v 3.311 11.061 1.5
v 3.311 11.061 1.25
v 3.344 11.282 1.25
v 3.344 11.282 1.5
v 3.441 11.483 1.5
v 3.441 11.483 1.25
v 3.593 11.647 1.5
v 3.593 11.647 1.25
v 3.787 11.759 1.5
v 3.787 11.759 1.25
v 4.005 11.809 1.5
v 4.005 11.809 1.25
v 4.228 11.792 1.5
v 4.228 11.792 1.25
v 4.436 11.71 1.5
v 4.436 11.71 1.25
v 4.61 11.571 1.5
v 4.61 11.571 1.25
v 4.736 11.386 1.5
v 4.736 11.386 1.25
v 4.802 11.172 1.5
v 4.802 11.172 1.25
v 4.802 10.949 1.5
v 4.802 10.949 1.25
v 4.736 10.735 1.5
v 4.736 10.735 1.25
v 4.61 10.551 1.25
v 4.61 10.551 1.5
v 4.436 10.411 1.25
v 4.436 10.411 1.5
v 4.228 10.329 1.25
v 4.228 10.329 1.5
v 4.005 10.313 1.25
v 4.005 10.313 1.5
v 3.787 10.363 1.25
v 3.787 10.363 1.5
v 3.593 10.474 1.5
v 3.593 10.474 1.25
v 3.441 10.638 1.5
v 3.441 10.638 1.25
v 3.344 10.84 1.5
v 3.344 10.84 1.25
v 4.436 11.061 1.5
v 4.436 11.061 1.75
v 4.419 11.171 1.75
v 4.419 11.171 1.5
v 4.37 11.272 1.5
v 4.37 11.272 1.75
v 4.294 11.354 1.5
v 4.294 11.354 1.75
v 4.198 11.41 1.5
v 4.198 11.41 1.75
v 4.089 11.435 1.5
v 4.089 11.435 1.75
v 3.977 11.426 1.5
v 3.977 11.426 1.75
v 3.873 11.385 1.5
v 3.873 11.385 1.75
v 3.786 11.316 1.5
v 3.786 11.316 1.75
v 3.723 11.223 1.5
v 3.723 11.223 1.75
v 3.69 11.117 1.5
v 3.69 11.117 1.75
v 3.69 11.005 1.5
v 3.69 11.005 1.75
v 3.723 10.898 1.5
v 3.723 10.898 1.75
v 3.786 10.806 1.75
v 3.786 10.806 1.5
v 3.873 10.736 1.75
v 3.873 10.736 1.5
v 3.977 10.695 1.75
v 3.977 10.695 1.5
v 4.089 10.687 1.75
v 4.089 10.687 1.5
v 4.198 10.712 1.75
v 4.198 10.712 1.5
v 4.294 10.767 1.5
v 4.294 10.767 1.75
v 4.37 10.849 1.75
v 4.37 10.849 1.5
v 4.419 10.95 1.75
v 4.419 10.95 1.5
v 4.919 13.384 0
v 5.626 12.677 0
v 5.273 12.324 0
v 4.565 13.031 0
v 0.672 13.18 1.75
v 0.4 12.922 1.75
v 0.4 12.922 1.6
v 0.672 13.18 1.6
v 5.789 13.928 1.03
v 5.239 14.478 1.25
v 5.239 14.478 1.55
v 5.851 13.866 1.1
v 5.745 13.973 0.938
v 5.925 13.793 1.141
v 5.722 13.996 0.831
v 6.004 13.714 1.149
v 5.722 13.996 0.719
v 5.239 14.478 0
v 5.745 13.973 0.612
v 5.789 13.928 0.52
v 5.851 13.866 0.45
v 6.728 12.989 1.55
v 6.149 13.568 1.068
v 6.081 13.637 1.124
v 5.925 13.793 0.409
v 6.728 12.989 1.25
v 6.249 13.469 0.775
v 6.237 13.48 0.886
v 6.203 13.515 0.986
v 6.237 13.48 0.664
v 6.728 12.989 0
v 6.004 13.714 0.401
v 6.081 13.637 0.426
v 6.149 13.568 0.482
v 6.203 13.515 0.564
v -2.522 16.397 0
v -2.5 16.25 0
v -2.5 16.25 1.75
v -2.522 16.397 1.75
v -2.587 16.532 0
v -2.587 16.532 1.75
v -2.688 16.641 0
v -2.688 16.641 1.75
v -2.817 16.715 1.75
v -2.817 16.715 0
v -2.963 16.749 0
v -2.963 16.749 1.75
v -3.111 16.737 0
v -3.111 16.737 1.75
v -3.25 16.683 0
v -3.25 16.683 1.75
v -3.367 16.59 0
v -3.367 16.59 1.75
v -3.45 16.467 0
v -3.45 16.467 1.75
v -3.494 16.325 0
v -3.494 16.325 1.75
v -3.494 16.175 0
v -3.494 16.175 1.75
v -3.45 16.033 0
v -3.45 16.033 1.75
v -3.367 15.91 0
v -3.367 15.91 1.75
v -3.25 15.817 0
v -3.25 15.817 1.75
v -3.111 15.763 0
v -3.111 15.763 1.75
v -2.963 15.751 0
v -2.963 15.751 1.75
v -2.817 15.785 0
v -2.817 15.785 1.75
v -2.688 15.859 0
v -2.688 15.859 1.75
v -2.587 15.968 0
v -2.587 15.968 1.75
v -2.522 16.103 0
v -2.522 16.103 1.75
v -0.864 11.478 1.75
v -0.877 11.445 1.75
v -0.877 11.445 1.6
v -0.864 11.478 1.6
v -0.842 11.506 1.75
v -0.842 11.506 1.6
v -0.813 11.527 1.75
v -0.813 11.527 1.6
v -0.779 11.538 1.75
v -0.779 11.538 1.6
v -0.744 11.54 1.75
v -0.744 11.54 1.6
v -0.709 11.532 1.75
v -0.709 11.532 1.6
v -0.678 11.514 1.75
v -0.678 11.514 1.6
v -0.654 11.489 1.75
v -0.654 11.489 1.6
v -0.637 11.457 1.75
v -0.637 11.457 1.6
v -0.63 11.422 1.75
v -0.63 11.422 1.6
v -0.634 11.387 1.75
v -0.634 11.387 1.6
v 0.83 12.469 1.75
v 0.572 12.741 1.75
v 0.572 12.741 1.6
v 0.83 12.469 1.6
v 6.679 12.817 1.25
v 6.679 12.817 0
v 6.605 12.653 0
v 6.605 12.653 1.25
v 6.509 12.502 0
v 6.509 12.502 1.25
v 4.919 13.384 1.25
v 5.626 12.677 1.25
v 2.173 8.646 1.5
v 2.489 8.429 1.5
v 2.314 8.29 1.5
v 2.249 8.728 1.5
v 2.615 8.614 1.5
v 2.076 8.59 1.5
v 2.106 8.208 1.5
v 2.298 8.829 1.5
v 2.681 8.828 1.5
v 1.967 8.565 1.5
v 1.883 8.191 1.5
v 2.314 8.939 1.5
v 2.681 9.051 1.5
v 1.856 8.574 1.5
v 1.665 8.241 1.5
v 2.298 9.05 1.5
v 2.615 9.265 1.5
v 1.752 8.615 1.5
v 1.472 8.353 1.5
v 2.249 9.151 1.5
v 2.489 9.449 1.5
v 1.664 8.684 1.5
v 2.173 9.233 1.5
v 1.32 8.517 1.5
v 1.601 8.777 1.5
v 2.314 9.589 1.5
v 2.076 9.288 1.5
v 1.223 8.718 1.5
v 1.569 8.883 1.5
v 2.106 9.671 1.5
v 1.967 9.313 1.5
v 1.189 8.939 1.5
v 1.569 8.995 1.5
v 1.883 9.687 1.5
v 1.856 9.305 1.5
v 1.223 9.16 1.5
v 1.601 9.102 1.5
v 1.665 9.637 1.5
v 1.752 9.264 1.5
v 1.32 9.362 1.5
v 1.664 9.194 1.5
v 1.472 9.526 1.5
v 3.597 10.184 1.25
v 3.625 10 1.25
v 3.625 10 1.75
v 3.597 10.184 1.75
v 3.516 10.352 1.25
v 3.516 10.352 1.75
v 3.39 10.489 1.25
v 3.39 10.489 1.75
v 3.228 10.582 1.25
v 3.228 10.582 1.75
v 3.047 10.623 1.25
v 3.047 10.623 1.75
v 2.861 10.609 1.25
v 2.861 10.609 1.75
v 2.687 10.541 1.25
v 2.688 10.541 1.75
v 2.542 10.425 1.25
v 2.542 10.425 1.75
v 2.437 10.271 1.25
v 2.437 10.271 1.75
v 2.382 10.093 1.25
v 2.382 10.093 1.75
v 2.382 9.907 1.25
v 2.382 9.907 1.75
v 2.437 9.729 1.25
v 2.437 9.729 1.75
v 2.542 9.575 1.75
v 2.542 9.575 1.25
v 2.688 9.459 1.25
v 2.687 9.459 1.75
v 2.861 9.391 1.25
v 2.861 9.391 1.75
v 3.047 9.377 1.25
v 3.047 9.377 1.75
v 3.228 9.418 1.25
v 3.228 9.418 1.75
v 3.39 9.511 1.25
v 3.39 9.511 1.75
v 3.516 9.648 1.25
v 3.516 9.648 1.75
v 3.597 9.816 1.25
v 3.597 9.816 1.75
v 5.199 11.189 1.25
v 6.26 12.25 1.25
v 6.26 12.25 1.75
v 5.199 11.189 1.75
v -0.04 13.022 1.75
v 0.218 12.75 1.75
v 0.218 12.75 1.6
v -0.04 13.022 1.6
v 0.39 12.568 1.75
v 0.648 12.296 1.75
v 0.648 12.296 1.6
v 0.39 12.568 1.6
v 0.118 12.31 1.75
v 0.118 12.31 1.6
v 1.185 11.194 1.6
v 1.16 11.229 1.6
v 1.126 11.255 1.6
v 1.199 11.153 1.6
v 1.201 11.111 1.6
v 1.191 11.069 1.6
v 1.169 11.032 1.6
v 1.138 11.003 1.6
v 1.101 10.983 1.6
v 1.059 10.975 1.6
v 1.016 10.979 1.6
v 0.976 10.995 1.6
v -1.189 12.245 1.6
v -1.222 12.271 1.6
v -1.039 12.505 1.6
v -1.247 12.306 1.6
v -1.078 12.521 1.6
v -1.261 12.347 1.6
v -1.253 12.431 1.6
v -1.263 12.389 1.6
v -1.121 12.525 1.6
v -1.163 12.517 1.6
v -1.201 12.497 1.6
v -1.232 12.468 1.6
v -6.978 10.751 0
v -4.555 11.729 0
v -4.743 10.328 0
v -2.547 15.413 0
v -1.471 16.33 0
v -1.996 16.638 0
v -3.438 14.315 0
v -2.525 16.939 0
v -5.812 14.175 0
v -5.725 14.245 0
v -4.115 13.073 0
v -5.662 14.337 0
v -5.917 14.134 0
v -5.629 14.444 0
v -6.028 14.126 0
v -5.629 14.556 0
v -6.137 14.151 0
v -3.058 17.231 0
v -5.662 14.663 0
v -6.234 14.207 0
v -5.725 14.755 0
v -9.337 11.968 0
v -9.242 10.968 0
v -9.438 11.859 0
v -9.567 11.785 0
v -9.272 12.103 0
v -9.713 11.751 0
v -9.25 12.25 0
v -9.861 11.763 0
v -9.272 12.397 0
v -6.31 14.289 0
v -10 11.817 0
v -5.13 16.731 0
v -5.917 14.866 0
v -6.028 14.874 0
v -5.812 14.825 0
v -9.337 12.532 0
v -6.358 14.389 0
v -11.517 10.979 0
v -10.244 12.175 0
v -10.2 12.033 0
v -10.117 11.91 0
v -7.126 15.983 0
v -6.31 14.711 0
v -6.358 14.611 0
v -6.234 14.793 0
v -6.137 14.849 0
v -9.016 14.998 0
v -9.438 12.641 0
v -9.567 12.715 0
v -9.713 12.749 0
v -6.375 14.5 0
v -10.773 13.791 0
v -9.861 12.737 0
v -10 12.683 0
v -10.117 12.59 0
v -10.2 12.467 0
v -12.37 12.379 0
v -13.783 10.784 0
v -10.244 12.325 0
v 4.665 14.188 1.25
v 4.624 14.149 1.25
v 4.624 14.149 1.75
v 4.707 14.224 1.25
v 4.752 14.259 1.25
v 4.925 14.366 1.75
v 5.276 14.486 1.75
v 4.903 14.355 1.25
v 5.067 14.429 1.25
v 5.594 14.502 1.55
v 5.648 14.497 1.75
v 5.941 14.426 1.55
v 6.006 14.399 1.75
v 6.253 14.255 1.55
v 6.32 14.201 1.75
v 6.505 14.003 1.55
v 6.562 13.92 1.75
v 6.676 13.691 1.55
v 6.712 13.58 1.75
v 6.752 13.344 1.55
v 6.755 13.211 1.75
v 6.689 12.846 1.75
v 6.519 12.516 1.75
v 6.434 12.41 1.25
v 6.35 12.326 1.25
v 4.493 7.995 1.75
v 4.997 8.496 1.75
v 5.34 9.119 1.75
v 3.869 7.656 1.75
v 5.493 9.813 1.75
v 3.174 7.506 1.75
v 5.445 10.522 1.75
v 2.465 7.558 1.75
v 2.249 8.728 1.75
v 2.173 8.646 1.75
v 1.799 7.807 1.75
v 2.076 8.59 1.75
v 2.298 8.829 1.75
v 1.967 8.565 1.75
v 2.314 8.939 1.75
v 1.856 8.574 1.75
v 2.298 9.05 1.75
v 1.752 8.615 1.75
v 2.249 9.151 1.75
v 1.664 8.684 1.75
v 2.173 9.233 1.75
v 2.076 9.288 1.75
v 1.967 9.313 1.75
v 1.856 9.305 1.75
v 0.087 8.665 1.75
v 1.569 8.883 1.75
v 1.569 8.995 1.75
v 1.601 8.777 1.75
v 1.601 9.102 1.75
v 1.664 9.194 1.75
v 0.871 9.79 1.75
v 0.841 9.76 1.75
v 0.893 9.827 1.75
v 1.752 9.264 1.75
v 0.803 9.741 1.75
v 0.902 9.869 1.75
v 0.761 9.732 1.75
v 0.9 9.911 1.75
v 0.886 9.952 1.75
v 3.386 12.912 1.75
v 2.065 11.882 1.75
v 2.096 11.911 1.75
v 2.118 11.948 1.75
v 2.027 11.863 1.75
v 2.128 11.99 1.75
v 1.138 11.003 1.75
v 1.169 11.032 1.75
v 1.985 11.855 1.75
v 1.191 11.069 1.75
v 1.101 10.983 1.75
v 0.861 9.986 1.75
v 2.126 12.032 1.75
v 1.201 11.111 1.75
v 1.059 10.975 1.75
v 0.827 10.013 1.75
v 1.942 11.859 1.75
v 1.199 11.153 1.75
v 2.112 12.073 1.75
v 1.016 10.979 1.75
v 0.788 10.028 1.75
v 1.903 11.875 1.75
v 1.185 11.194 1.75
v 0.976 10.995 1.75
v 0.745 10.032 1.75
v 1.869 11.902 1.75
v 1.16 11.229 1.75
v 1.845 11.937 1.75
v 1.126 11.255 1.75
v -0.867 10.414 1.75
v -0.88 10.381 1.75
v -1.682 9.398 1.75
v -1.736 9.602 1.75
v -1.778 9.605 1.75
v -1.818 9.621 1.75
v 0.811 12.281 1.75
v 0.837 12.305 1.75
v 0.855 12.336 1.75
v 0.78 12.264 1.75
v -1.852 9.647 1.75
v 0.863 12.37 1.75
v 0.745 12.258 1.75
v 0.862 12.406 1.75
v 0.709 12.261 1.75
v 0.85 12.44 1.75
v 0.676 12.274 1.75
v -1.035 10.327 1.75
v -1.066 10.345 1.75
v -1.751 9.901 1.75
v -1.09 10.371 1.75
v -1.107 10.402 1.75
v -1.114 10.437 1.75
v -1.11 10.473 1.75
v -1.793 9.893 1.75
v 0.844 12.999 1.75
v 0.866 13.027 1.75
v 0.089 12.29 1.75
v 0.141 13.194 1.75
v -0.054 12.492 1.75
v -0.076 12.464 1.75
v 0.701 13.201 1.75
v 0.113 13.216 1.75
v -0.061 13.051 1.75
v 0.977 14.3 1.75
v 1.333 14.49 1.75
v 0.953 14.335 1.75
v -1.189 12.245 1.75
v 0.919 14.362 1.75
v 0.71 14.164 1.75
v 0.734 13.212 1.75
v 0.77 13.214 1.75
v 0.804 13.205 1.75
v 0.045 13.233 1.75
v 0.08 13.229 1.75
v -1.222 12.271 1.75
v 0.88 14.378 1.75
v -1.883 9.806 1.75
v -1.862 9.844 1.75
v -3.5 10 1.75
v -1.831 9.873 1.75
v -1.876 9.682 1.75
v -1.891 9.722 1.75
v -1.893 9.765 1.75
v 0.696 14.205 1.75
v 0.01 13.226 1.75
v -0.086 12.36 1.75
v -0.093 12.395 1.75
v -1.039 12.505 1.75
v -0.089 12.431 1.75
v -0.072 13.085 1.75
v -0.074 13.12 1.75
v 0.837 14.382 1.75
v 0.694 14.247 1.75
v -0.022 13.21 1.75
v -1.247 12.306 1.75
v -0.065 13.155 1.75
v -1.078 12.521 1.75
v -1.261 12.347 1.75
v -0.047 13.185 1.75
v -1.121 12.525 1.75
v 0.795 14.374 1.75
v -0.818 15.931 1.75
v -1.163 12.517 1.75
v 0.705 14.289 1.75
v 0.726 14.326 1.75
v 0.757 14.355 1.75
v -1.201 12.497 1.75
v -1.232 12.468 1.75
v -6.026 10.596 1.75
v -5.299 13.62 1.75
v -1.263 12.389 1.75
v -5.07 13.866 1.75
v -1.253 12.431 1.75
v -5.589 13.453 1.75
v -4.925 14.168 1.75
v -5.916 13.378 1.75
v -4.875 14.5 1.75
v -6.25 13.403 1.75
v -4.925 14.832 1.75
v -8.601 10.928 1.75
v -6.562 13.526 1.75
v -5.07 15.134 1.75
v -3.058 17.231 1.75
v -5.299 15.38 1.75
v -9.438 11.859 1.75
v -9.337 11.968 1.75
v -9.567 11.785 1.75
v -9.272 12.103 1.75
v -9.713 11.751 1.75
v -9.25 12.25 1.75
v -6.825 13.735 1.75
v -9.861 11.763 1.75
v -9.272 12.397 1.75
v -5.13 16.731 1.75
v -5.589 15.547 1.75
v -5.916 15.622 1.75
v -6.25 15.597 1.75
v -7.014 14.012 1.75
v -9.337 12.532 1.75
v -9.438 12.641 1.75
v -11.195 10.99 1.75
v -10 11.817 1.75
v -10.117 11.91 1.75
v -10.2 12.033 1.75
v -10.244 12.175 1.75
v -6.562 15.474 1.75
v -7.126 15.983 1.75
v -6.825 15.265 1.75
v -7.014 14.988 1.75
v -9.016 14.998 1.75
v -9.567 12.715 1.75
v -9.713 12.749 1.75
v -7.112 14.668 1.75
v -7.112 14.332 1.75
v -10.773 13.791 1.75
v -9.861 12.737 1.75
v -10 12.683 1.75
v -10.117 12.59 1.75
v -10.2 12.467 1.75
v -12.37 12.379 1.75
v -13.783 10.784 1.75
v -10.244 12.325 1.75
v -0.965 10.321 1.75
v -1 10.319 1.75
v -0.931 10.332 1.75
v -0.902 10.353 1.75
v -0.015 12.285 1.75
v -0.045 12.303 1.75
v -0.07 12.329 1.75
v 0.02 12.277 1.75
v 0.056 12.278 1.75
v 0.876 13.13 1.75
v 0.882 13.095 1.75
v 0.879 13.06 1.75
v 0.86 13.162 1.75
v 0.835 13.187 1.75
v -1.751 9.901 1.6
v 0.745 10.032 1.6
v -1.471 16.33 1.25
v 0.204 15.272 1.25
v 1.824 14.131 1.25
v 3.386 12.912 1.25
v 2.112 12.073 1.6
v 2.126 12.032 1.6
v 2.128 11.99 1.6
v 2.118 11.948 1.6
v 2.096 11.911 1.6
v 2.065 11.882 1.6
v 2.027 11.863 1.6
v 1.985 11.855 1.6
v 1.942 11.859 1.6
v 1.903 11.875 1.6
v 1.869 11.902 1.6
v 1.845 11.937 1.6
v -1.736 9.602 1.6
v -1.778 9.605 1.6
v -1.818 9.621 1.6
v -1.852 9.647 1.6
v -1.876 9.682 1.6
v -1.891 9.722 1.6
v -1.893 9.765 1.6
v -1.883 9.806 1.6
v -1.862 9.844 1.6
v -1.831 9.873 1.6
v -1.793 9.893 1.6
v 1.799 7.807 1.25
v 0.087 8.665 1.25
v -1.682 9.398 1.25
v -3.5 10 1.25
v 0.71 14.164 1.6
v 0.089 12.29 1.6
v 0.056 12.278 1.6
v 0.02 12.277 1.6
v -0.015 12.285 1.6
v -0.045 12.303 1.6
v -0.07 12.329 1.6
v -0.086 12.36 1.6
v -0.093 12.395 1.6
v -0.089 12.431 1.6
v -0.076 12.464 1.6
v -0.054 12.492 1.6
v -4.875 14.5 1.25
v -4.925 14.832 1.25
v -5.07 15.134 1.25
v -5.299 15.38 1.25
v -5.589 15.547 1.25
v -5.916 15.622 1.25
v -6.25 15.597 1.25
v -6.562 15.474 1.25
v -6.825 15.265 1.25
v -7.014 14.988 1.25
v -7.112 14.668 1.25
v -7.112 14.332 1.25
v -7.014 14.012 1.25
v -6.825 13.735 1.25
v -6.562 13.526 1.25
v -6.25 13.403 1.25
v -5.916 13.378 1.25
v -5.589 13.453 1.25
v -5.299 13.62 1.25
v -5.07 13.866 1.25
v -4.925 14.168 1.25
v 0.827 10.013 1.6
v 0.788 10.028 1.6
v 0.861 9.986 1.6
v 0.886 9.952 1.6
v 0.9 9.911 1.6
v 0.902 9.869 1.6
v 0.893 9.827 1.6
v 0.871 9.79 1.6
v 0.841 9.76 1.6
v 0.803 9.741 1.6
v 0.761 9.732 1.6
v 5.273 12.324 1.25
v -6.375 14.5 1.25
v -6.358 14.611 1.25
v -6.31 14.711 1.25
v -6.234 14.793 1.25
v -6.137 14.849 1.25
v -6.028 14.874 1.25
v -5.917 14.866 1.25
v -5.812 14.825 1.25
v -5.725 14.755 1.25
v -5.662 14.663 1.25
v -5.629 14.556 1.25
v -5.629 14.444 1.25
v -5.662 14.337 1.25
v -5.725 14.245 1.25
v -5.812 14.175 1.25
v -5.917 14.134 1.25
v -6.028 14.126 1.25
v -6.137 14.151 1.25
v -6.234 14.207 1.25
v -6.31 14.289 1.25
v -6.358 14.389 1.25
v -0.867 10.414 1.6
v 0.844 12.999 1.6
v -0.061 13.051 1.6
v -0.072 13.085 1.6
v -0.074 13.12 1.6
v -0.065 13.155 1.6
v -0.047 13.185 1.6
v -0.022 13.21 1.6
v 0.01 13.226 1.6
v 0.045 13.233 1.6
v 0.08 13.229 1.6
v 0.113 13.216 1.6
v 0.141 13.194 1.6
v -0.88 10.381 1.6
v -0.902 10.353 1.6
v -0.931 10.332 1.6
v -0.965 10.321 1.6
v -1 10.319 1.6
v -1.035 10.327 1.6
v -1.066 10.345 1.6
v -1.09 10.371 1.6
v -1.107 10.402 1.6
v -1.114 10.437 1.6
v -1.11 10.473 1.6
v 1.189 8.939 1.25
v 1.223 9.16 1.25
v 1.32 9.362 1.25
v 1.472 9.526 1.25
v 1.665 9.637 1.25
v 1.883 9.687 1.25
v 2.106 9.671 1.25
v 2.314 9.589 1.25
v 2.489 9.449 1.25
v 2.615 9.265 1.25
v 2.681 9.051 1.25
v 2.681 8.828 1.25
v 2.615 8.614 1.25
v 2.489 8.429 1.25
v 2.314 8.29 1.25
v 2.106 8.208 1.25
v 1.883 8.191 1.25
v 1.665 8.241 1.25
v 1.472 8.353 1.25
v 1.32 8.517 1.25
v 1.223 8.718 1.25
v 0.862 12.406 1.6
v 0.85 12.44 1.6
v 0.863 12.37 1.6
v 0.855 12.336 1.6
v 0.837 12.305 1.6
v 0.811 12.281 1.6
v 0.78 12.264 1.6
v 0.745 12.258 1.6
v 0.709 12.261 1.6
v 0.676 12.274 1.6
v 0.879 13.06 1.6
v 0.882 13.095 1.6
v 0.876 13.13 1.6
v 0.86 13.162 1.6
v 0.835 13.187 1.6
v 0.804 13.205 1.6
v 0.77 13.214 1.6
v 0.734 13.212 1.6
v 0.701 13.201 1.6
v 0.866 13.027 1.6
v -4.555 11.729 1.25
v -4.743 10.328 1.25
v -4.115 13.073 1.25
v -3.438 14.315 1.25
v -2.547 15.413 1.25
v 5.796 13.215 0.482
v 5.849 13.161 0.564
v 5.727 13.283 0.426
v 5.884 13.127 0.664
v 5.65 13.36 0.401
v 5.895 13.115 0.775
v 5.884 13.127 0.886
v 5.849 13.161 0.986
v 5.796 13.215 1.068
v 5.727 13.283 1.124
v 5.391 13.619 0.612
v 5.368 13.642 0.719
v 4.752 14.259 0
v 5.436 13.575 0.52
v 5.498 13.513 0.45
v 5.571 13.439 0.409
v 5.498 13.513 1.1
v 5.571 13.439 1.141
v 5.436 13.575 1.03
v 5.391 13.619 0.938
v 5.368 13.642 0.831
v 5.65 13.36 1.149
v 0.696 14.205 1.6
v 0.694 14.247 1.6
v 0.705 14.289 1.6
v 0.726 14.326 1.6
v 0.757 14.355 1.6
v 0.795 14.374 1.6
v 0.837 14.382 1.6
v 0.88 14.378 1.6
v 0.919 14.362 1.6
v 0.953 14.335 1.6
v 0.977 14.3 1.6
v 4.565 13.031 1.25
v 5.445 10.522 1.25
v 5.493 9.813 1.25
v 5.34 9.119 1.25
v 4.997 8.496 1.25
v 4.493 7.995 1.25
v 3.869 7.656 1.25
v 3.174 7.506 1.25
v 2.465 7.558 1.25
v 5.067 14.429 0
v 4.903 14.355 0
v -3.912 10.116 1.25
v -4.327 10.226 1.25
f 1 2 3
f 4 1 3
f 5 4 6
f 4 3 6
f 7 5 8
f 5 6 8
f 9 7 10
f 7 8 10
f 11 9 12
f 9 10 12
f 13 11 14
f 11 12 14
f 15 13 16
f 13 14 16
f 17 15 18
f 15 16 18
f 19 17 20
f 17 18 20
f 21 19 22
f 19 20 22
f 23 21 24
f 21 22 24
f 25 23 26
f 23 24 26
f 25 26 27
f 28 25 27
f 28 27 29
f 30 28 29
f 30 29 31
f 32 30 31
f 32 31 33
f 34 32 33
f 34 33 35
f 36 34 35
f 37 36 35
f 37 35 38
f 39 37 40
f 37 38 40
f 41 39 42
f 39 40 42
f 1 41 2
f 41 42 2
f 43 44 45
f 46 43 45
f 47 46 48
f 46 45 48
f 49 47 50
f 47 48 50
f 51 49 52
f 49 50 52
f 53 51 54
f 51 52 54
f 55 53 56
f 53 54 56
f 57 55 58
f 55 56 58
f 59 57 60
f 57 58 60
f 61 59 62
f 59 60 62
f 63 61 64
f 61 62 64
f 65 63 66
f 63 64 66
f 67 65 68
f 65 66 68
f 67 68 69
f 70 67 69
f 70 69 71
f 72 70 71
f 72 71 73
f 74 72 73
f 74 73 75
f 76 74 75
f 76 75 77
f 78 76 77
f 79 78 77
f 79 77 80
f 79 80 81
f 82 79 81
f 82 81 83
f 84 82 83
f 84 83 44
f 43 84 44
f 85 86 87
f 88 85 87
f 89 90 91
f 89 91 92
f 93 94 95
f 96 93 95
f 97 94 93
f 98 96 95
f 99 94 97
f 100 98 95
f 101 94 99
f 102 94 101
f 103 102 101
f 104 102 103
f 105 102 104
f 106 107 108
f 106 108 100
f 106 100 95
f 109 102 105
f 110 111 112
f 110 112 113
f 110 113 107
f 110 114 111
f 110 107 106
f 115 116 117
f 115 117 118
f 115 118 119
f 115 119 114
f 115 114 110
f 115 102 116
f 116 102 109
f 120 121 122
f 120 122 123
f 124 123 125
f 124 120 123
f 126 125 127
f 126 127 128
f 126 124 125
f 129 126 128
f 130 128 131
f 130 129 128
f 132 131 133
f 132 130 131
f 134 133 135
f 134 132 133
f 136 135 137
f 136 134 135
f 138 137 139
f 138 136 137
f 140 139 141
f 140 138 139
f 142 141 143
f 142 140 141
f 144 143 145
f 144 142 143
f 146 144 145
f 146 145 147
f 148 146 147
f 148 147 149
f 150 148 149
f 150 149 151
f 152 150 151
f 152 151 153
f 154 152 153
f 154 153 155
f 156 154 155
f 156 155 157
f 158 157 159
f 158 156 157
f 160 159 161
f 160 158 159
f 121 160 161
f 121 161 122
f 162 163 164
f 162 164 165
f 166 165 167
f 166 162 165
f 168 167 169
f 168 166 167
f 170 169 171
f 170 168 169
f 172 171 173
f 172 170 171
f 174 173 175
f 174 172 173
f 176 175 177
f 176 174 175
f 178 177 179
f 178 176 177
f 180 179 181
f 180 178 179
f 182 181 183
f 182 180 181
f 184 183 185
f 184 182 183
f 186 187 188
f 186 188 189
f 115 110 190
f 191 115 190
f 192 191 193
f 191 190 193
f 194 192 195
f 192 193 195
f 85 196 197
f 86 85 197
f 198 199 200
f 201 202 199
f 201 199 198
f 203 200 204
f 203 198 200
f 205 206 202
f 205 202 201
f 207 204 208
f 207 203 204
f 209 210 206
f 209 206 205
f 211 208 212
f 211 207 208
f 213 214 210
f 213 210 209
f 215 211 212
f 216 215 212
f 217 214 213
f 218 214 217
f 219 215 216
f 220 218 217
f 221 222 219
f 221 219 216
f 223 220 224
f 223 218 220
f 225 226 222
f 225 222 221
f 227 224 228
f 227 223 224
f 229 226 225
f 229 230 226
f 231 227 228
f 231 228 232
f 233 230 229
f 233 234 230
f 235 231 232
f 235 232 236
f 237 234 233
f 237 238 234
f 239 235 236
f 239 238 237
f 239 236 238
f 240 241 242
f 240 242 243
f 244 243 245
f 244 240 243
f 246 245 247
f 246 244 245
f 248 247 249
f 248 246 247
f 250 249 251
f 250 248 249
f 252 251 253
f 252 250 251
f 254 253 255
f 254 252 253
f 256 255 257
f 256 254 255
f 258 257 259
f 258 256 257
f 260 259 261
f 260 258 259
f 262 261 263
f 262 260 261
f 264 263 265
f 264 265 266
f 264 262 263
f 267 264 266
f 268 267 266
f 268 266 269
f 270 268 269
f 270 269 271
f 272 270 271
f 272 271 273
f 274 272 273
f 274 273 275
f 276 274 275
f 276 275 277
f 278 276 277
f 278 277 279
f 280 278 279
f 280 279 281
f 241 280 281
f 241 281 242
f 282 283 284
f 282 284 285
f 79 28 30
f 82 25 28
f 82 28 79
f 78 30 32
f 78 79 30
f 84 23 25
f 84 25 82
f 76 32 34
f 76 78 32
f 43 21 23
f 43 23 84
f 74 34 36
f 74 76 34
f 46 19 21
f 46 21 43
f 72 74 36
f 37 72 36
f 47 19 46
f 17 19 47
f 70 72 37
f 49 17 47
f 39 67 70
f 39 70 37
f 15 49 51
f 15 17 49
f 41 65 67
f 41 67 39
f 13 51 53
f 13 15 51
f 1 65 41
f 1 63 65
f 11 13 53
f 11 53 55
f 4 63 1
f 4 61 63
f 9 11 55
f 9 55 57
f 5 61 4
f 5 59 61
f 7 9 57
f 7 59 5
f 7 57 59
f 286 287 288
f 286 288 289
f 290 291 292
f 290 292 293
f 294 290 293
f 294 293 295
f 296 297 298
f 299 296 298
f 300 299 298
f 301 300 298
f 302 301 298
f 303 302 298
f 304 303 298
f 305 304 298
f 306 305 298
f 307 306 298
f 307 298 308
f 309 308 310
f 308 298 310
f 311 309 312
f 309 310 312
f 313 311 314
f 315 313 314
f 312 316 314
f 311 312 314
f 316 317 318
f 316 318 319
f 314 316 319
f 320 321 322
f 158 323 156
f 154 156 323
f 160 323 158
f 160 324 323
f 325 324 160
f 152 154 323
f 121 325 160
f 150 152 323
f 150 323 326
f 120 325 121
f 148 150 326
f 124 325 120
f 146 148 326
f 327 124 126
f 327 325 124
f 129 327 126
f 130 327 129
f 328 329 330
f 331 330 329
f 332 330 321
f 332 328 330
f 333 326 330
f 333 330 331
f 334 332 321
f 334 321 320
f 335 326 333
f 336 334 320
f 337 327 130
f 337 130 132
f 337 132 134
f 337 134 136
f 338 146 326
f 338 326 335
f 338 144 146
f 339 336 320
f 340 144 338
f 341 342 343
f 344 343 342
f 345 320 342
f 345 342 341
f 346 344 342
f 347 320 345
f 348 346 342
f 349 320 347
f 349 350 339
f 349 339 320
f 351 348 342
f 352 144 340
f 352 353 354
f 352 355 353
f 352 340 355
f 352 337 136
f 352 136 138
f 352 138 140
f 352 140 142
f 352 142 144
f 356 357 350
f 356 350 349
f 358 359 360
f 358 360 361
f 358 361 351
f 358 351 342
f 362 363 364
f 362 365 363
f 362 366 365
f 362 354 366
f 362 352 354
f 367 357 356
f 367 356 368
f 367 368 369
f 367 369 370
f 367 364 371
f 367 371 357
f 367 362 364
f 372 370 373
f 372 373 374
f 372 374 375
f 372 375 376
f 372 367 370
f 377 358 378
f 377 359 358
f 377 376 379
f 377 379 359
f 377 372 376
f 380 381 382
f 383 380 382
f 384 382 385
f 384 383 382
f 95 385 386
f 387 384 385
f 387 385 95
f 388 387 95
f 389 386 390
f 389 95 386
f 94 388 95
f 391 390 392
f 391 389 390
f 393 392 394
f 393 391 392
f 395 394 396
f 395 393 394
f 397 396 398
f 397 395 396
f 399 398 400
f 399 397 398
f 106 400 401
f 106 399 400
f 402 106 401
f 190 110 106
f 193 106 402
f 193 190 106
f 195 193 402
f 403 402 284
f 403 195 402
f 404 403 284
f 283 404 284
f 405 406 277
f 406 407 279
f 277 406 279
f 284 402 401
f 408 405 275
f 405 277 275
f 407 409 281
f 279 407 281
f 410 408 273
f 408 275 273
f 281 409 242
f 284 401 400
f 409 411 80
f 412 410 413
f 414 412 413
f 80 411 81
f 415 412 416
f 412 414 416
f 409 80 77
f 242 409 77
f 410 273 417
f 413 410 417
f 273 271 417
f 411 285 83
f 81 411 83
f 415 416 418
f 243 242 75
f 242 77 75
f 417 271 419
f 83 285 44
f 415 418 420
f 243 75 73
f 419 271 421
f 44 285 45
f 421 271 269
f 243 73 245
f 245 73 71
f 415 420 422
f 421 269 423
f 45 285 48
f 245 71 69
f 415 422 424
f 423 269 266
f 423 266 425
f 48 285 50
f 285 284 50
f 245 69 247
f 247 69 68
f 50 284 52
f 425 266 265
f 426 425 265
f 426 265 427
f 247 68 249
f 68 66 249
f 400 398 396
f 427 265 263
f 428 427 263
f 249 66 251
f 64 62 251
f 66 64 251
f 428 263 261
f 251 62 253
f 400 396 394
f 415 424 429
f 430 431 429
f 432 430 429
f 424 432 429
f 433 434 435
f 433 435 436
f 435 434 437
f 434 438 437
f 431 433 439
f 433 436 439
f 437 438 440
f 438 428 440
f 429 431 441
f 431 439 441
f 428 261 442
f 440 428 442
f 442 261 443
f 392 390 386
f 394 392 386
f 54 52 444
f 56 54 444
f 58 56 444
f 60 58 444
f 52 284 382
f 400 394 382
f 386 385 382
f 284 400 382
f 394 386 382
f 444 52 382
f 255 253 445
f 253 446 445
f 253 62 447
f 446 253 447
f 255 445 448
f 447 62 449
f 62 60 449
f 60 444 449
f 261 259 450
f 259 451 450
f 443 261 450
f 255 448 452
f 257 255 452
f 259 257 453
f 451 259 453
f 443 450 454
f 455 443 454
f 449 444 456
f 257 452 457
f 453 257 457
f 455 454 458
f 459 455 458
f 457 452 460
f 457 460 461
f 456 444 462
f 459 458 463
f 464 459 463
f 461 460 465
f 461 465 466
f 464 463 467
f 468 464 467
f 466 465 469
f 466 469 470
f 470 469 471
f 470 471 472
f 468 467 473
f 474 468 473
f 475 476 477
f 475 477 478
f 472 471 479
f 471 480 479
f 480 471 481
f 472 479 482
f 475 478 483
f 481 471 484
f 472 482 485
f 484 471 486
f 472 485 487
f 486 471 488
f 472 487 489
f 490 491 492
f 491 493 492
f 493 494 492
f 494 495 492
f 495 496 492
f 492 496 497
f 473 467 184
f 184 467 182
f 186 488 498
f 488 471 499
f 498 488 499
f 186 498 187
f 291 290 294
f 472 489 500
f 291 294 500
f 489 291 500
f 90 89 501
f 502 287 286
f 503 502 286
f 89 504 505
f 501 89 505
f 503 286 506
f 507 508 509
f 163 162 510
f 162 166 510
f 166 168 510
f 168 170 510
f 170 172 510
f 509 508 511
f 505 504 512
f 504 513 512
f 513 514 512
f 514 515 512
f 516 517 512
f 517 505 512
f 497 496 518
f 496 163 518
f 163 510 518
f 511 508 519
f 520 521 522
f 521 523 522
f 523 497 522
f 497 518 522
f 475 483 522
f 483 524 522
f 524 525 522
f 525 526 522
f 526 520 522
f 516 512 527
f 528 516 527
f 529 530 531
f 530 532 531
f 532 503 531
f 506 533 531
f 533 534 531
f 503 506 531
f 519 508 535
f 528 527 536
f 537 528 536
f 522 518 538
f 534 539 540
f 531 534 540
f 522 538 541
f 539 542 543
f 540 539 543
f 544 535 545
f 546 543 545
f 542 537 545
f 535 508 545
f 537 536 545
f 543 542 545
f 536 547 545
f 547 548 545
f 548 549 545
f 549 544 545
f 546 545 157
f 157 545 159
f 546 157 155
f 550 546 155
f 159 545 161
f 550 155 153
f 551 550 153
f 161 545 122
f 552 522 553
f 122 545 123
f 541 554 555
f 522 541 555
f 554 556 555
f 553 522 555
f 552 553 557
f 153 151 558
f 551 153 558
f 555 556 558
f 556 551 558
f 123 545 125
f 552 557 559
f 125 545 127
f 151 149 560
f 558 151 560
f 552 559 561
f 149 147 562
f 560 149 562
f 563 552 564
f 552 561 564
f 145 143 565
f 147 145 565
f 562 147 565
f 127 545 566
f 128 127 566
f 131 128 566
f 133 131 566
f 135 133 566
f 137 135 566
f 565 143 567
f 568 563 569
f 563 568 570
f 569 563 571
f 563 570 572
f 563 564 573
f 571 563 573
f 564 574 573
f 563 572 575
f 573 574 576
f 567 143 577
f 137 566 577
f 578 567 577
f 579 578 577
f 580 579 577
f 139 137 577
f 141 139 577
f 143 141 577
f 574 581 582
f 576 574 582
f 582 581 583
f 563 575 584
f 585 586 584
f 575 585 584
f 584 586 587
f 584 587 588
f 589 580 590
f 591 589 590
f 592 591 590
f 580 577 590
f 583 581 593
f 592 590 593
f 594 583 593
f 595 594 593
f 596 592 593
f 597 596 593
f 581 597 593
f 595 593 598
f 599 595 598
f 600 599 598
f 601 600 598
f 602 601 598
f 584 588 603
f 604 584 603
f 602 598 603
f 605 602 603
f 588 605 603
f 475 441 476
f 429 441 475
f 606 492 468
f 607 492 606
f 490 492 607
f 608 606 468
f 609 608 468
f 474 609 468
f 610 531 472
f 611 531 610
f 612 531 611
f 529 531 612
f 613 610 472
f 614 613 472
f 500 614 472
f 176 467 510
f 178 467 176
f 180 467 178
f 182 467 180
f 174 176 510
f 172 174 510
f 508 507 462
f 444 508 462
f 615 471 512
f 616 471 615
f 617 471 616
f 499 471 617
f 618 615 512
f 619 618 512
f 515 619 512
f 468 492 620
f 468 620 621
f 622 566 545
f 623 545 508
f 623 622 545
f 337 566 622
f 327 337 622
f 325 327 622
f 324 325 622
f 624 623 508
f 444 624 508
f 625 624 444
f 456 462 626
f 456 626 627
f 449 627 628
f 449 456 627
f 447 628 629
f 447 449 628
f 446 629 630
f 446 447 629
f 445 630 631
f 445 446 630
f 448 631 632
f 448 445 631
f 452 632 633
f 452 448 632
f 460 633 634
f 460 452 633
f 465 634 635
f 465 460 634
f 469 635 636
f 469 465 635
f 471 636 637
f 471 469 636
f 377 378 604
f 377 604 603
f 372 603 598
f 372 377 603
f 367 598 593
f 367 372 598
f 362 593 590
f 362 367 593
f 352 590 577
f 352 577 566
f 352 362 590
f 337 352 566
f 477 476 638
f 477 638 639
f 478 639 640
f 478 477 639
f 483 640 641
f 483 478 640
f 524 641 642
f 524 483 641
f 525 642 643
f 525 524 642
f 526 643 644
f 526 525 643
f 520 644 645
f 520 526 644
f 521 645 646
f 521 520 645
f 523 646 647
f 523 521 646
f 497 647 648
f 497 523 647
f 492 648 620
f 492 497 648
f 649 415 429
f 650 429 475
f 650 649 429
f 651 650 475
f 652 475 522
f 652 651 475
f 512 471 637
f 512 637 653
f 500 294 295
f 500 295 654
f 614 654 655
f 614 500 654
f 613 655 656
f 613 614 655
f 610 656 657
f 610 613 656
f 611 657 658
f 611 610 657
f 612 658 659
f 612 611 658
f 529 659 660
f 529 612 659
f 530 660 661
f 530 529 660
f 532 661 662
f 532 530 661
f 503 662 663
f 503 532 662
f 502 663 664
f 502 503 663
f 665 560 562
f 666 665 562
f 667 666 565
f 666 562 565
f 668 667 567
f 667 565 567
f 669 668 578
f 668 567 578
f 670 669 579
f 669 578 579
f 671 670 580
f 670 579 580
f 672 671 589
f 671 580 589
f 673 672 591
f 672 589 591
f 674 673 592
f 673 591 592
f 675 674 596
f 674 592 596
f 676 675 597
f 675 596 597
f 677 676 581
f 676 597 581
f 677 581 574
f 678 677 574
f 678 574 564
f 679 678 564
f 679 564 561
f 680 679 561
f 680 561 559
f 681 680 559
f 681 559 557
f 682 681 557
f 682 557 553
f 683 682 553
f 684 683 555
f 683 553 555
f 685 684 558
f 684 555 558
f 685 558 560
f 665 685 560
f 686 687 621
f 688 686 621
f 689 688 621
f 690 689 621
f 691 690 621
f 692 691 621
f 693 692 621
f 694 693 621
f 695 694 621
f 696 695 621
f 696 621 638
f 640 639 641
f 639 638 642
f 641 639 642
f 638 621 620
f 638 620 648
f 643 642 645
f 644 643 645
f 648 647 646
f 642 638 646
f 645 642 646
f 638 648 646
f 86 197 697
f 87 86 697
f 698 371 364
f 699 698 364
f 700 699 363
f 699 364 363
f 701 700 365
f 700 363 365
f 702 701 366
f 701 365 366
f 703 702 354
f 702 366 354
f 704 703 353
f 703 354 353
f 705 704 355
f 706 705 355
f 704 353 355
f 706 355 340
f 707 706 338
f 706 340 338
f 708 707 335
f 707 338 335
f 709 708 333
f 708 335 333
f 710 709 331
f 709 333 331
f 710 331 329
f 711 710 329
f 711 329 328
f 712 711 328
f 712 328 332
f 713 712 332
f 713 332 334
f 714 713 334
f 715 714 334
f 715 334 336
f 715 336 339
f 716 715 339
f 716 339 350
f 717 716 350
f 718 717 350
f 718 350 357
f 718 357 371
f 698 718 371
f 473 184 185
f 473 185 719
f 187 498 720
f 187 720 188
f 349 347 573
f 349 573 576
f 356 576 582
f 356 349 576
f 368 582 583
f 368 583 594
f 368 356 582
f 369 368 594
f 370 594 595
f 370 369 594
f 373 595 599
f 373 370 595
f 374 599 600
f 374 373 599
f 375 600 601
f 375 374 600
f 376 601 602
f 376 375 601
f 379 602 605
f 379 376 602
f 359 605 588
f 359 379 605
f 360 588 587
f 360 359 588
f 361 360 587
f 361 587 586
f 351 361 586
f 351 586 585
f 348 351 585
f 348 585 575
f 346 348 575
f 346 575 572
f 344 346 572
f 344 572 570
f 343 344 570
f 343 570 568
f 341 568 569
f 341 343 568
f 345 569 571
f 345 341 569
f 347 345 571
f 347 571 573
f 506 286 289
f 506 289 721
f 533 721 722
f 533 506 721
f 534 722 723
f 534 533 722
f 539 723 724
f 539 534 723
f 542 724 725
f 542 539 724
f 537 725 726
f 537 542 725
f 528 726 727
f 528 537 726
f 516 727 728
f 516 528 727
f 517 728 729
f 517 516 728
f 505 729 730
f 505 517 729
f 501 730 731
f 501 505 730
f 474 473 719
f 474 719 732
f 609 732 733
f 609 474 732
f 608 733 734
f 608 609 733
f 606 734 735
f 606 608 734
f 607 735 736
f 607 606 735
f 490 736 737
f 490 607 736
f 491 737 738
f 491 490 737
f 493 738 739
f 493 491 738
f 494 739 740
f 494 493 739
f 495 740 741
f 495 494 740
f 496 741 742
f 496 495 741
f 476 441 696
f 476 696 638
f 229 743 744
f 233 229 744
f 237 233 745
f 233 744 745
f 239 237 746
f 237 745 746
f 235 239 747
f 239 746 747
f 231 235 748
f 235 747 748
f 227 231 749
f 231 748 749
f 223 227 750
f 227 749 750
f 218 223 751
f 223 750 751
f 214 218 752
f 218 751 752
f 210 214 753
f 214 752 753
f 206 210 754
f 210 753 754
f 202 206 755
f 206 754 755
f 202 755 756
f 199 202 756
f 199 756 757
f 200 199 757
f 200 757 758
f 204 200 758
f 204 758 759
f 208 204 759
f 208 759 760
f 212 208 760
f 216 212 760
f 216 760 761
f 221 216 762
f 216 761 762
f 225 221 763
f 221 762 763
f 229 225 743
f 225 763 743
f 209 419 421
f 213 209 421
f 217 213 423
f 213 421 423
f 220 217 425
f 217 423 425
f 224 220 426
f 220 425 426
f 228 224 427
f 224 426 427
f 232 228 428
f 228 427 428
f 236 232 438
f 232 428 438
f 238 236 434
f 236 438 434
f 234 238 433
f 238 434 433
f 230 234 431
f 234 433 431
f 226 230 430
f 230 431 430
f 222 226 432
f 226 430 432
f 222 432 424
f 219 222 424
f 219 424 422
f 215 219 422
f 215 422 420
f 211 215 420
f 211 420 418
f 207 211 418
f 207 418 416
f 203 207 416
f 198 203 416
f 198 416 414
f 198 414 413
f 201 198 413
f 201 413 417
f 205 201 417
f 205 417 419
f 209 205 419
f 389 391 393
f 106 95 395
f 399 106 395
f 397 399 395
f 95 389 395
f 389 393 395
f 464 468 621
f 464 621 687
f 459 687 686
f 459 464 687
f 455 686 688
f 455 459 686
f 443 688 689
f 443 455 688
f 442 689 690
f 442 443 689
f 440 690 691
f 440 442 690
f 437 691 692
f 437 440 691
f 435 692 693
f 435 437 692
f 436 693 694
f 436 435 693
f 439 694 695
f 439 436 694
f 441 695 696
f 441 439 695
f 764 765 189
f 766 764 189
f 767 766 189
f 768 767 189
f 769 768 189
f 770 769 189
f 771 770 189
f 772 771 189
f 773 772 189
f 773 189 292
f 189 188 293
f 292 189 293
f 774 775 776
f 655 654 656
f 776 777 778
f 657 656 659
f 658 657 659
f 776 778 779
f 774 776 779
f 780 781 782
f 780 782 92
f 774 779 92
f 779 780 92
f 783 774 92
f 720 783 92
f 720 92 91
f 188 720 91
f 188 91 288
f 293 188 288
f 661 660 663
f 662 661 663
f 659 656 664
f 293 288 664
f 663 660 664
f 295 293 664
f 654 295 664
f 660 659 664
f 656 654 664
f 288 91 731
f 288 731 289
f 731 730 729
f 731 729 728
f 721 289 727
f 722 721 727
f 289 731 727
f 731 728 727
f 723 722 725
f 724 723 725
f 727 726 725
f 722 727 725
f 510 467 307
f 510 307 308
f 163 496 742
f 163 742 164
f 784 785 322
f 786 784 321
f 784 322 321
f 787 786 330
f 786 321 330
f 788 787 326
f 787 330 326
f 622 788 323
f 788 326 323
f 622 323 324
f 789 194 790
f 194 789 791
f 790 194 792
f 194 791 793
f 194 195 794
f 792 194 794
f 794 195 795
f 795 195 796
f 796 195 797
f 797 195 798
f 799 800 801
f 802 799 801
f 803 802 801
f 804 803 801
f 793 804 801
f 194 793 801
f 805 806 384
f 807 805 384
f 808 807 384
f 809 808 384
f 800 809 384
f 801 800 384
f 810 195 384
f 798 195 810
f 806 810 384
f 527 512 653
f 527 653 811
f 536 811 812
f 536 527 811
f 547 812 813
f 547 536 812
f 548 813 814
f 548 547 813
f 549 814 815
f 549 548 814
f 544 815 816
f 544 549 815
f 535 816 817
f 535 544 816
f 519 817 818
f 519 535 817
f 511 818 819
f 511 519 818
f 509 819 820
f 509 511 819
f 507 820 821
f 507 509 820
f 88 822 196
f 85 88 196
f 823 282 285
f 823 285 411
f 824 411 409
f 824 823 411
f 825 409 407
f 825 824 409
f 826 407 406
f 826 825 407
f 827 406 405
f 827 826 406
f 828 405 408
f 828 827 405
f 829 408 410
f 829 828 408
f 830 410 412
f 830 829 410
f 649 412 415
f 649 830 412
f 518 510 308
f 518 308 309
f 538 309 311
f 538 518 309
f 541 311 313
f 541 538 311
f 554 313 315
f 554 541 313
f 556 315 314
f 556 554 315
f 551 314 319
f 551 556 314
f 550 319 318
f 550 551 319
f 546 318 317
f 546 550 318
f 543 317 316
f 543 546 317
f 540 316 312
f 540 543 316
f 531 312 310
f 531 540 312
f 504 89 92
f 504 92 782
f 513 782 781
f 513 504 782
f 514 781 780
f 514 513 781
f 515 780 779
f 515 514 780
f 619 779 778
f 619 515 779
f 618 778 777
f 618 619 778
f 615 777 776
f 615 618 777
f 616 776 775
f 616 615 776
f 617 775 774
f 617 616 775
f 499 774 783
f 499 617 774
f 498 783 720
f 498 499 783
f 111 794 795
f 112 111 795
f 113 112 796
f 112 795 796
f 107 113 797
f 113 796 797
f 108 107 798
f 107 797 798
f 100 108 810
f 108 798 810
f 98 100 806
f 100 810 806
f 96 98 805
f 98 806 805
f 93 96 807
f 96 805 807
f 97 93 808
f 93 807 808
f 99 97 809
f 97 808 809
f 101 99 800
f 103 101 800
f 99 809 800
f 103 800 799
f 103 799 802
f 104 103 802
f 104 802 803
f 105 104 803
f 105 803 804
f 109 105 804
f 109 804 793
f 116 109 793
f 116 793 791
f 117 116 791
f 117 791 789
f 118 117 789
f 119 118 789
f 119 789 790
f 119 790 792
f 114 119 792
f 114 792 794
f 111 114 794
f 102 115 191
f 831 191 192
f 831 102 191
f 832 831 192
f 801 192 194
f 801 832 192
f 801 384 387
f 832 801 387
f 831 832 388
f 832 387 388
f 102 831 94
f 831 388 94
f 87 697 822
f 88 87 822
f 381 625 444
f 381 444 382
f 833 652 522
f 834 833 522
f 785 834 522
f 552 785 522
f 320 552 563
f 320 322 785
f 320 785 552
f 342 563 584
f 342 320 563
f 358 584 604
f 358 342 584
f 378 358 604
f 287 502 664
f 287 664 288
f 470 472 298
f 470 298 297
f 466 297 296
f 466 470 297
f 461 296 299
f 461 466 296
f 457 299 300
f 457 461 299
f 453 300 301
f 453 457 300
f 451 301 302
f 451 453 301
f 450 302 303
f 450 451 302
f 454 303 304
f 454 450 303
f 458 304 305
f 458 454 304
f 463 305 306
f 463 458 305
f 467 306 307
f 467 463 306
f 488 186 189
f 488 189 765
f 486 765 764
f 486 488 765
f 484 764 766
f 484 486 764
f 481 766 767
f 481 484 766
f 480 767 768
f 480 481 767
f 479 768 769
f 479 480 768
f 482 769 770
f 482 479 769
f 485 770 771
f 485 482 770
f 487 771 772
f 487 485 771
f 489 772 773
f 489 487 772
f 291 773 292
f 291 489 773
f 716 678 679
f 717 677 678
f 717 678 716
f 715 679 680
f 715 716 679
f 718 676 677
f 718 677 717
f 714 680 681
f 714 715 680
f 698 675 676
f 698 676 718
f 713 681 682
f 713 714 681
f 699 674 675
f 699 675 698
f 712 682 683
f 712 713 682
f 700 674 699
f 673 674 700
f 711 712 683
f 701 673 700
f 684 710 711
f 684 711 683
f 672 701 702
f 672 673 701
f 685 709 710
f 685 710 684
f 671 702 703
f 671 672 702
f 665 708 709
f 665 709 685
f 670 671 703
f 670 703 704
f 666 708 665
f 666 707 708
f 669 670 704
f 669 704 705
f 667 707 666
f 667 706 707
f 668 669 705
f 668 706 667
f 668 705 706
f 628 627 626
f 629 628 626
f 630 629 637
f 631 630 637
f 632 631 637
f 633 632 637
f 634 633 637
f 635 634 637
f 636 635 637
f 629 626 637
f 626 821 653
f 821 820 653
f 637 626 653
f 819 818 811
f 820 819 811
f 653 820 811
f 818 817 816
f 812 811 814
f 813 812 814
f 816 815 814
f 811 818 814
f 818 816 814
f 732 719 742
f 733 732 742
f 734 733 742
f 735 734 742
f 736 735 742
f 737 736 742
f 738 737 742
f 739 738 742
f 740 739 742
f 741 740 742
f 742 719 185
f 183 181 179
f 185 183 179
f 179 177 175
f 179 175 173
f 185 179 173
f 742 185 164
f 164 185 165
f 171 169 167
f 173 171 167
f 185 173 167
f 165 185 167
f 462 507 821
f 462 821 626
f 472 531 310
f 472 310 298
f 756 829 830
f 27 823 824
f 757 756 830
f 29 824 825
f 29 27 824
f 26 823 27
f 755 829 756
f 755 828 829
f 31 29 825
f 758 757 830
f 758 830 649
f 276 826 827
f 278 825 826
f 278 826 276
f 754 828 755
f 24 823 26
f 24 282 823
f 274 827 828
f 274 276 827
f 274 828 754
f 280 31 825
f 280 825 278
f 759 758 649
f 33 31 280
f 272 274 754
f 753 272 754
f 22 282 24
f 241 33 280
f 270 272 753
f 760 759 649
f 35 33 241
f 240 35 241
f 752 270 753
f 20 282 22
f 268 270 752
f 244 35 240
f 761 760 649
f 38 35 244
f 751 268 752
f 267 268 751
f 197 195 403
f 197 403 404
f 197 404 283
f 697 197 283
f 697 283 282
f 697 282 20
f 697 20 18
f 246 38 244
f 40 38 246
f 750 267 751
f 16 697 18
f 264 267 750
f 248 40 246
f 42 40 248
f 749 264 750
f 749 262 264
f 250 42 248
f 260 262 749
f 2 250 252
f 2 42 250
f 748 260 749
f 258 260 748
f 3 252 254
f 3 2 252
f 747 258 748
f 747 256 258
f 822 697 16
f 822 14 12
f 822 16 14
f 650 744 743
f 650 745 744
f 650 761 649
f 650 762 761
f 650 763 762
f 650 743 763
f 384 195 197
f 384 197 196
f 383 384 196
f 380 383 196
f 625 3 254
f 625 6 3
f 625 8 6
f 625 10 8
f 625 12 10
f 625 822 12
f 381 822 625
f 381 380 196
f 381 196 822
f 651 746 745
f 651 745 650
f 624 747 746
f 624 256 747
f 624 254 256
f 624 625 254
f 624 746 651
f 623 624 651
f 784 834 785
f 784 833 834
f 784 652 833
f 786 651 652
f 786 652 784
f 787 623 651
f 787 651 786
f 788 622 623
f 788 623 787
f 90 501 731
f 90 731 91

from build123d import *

# Parameters (mm, degrees)
CROQUIS1_R                 = 0.625
CROQUIS1_R_2               = 0.5
SALIENTE_EXTRUIR1_DEPTH    = 1.75
CROQUIS2_R                 = 7.75
CORTAR_EXTRUIR1_DEPTH      = 1.25
SALIENTE_EXTRUIR2_DEPTH    = 1.25
CORTAR_EXTRUIR2_DEPTH      = 0.3
CROQUIS5_R                 = 0.75
CORTAR_EXTRUIR3_DEPTH      = 0.25
CROQUIS7_R                 = 1.125
CORTAR_EXTRUIR4_DEPTH      = 0.5
CORTAR_EXTRUIR5_DEPTH      = 0.15
M1X0_25_TAPPED_HOLE1_D     = 0.75
M1X0_25_TAPPED_HOLE2_D     = 0.75
M1X0_25_TAPPED_HOLE3_D     = 0.75
M1X0_25_TAPPED_HOLE3_DEPTH = 0.5


with BuildPart() as part:
    # Croquis1 → Saliente-Extruir1 (new body)
    with BuildSketch(Plane.XY):
        with BuildLine():
            Line((6.259644122, 12.249974926), (5.198983951, 11.189314754))
            ThreePointArc((5.198983951, 11.189314754), (4.763256008, 8.227733584), (1.799492386, 7.807106599))
            ThreePointArc((1.799492386, 7.807106599), (-0.79068784, 9.047504388), (-3.5, 10))
            ThreePointArc((-3.5, 10), (-8.600559157, 10.927738054), (-13.78279853, 10.783527469))
            ThreePointArc((-13.78279853, 10.783527469), (-9.016404165, 14.998481788), (-3.058096956, 17.230729613))
            ThreePointArc((-3.058096956, 17.230729613), (0.268930152, 15.227921239), (3.386067713, 12.911932422))
            Line((3.386067713, 12.911932422), (4.62350458, 14.14936929))
            ThreePointArc((4.62350458, 14.14936929), (6.451492666, 14.069616403), (6.259644122, 12.249974926))
        make_face()
        with Locations((3, 10)):
            Circle(CROQUIS1_R, mode=Mode.SUBTRACT)
        with Locations((-3, 16.25)):
            Circle(CROQUIS1_R_2, mode=Mode.SUBTRACT)
        with Locations((-9.75, 12.25)):
            Circle(CROQUIS1_R_2, mode=Mode.SUBTRACT)
    extrude(amount=SALIENTE_EXTRUIR1_DEPTH)

    # Croquis2 → Cortar-Extruir1 (cut)
    with BuildSketch(Plane(origin=(0, 0, 0), x_dir=(-1, 0, 0), z_dir=(0, 0, -1))):
        with Locations((-3, 10)):
            Circle(CROQUIS2_R)
    extrude(amount=-CORTAR_EXTRUIR1_DEPTH, mode=Mode.SUBTRACT)

    # Croquis3 → Saliente-Extruir2 (add)
    with BuildSketch(Plane(origin=(0, 0, 1.25), x_dir=(-1, 0, 0), z_dir=(0, 0, -1))):
        Polygon((-5.272601551, 12.323592527), (-4.56549477, 13.030699308), (-4.91904816, 13.384252698), (-5.626154942, 12.677145917), align=None)
        with BuildLine():
            Line((-6.508612401, 12.501795239), (-4.751795239, 14.258612401))
            ThreePointArc((-4.751795239, 14.258612401), (-4.983609366, 14.394748904), (-5.239087061, 14.47842736))
            Line((-5.239087061, 14.47842736), (-6.72842736, 12.989087061))
            ThreePointArc((-6.72842736, 12.989087061), (-6.644748904, 12.733609366), (-6.508612401, 12.501795239))
        make_face()
    extrude(amount=SALIENTE_EXTRUIR2_DEPTH)

    # Croquis4 → Cortar-Extruir2 (cut)
    with BuildSketch(Plane(origin=(0, 0, 1.25), x_dir=(-1, 0, 0), z_dir=(0, 0, -1))):
        with BuildLine():
            Line((-5.239087061, 14.47842736), (-6.72842736, 12.989087061))
            ThreePointArc((-6.72842736, 12.989087061), (-6.388006008, 14.138006008), (-5.239087061, 14.47842736))
        make_face()
    extrude(amount=-CORTAR_EXTRUIR2_DEPTH, mode=Mode.SUBTRACT)

    # Croquis5 → Cortar-Extruir3 (cut)
    with BuildSketch(Plane(origin=(0, 0, 1.25), x_dir=(-1, 0, 0), z_dir=(0, 0, -1))):
        with Locations((-4.060660172, 11.060660172)):
            Circle(CROQUIS5_R)
        with Locations((-1.939339828, 8.939339828)):
            Circle(CROQUIS5_R)
    extrude(amount=-CORTAR_EXTRUIR3_DEPTH, mode=Mode.SUBTRACT)

    # Croquis7 → Cortar-Extruir4 (cut)
    with BuildSketch(Plane.XY.offset(1.75)):
        with Locations((-6, 14.5)):
            Circle(CROQUIS7_R)
    extrude(amount=-CORTAR_EXTRUIR4_DEPTH, mode=Mode.SUBTRACT)

    # Croquis8 → Cortar-Extruir5 (cut)
    with BuildSketch(Plane.XY.offset(1.75)):
        with BuildLine():
            Line((0.977196105, 14.300379565), (2.112172354, 12.072863254))
            ThreePointArc((2.112172354, 12.072863254), (2.046619951, 11.871113701), (1.844870397, 11.936666104))
            Line((1.844870397, 11.936666104), (0.709894148, 14.164182415))
            ThreePointArc((0.709894148, 14.164182415), (0.775446551, 14.365931969), (0.977196105, 14.300379565))
        make_face()
        with BuildLine():
            Line((0.76093394, 9.732449668), (-1.735639897, 9.601609778))
            ThreePointArc((-1.735639897, 9.601609778), (-1.89328472, 9.743553814), (-1.751340684, 9.901198638))
            Line((-1.751340684, 9.901198638), (0.745233153, 10.032038529))
            ThreePointArc((0.745233153, 10.032038529), (0.902877977, 9.890094492), (0.76093394, 9.732449668))
        make_face()
        with BuildLine():
            Line((-1.038620668, 12.504903811), (1.126442841, 11.254903811))
            ThreePointArc((1.126442841, 11.254903811), (1.181346652, 11.05), (0.976442841, 10.995096189))
            Line((0.976442841, 10.995096189), (-1.188620668, 12.245096189))
            ThreePointArc((-1.188620668, 12.245096189), (-1.243524479, 12.45), (-1.038620668, 12.504903811))
        make_face()
        with BuildLine():
            Line((-0.633682247, 11.386577522), (-0.867127611, 10.414207601))
            ThreePointArc((-0.867127611, 10.414207601), (-1.017854522, 10.321842032), (-1.110220091, 10.472568942))
            Line((-1.110220091, 10.472568942), (-0.876774727, 11.444938863))
            ThreePointArc((-0.876774727, 11.444938863), (-0.726047817, 11.537304432), (-0.633682247, 11.386577522))
        make_face()
        with BuildLine():
            Line((-0.053831977, 12.491697608), (0.218183412, 12.749830574))
            Line((0.218183412, 12.749830574), (-0.039949554, 13.021845963))
            ThreePointArc((-0.039949554, 13.021845963), (-0.03532208, 13.198562081), (0.141394039, 13.193934607))
            Line((0.141394039, 13.193934607), (0.399527005, 12.921919218))
            Line((0.399527005, 12.921919218), (0.671542394, 13.180052184))
            ThreePointArc((0.671542394, 13.180052184), (0.848258512, 13.175424709), (0.843631038, 12.998708591))
            Line((0.843631038, 12.998708591), (0.571615649, 12.740575625))
            Line((0.571615649, 12.740575625), (0.829748614, 12.468560236))
            ThreePointArc((0.829748614, 12.468560236), (0.82512114, 12.291844118), (0.648405022, 12.296471592))
            Line((0.648405022, 12.296471592), (0.390272056, 12.568486981))
            Line((0.390272056, 12.568486981), (0.118256667, 12.310354015))
            ThreePointArc((0.118256667, 12.310354015), (-0.058459452, 12.31498149), (-0.053831977, 12.491697608))
        make_face()
    extrude(amount=-CORTAR_EXTRUIR5_DEPTH, mode=Mode.SUBTRACT)

    # M1x0.25 Tapped Hole1 (through all)
    with Locations(Plane(origin=(0, 0, 1.5), x_dir=(-1, 0, 0), z_dir=(0, 0, -1))):
        with Locations((-1.939339828, 8.939339828), (-4.060660172, 11.060660172)):
            Hole(M1X0_25_TAPPED_HOLE1_D / 2)

    # M1x0.25 Tapped Hole2 (through all)
    with Locations(Plane.XY.offset(1.25)):
        with Locations((-6, 14.5)):
            Hole(M1X0_25_TAPPED_HOLE2_D / 2)

    # M1x0.25 Tapped Hole3
    with Locations(Plane(origin=(9.858757211, 9.858757211, 0), x_dir=(-0.707106781, 0.707106781, 0), z_dir=(0.707106781, 0.707106781, 0))):
        with Locations((5.480077554, 0.775)):
            Hole(M1X0_25_TAPPED_HOLE3_D / 2, depth=M1X0_25_TAPPED_HOLE3_DEPTH)


solid = part.part
